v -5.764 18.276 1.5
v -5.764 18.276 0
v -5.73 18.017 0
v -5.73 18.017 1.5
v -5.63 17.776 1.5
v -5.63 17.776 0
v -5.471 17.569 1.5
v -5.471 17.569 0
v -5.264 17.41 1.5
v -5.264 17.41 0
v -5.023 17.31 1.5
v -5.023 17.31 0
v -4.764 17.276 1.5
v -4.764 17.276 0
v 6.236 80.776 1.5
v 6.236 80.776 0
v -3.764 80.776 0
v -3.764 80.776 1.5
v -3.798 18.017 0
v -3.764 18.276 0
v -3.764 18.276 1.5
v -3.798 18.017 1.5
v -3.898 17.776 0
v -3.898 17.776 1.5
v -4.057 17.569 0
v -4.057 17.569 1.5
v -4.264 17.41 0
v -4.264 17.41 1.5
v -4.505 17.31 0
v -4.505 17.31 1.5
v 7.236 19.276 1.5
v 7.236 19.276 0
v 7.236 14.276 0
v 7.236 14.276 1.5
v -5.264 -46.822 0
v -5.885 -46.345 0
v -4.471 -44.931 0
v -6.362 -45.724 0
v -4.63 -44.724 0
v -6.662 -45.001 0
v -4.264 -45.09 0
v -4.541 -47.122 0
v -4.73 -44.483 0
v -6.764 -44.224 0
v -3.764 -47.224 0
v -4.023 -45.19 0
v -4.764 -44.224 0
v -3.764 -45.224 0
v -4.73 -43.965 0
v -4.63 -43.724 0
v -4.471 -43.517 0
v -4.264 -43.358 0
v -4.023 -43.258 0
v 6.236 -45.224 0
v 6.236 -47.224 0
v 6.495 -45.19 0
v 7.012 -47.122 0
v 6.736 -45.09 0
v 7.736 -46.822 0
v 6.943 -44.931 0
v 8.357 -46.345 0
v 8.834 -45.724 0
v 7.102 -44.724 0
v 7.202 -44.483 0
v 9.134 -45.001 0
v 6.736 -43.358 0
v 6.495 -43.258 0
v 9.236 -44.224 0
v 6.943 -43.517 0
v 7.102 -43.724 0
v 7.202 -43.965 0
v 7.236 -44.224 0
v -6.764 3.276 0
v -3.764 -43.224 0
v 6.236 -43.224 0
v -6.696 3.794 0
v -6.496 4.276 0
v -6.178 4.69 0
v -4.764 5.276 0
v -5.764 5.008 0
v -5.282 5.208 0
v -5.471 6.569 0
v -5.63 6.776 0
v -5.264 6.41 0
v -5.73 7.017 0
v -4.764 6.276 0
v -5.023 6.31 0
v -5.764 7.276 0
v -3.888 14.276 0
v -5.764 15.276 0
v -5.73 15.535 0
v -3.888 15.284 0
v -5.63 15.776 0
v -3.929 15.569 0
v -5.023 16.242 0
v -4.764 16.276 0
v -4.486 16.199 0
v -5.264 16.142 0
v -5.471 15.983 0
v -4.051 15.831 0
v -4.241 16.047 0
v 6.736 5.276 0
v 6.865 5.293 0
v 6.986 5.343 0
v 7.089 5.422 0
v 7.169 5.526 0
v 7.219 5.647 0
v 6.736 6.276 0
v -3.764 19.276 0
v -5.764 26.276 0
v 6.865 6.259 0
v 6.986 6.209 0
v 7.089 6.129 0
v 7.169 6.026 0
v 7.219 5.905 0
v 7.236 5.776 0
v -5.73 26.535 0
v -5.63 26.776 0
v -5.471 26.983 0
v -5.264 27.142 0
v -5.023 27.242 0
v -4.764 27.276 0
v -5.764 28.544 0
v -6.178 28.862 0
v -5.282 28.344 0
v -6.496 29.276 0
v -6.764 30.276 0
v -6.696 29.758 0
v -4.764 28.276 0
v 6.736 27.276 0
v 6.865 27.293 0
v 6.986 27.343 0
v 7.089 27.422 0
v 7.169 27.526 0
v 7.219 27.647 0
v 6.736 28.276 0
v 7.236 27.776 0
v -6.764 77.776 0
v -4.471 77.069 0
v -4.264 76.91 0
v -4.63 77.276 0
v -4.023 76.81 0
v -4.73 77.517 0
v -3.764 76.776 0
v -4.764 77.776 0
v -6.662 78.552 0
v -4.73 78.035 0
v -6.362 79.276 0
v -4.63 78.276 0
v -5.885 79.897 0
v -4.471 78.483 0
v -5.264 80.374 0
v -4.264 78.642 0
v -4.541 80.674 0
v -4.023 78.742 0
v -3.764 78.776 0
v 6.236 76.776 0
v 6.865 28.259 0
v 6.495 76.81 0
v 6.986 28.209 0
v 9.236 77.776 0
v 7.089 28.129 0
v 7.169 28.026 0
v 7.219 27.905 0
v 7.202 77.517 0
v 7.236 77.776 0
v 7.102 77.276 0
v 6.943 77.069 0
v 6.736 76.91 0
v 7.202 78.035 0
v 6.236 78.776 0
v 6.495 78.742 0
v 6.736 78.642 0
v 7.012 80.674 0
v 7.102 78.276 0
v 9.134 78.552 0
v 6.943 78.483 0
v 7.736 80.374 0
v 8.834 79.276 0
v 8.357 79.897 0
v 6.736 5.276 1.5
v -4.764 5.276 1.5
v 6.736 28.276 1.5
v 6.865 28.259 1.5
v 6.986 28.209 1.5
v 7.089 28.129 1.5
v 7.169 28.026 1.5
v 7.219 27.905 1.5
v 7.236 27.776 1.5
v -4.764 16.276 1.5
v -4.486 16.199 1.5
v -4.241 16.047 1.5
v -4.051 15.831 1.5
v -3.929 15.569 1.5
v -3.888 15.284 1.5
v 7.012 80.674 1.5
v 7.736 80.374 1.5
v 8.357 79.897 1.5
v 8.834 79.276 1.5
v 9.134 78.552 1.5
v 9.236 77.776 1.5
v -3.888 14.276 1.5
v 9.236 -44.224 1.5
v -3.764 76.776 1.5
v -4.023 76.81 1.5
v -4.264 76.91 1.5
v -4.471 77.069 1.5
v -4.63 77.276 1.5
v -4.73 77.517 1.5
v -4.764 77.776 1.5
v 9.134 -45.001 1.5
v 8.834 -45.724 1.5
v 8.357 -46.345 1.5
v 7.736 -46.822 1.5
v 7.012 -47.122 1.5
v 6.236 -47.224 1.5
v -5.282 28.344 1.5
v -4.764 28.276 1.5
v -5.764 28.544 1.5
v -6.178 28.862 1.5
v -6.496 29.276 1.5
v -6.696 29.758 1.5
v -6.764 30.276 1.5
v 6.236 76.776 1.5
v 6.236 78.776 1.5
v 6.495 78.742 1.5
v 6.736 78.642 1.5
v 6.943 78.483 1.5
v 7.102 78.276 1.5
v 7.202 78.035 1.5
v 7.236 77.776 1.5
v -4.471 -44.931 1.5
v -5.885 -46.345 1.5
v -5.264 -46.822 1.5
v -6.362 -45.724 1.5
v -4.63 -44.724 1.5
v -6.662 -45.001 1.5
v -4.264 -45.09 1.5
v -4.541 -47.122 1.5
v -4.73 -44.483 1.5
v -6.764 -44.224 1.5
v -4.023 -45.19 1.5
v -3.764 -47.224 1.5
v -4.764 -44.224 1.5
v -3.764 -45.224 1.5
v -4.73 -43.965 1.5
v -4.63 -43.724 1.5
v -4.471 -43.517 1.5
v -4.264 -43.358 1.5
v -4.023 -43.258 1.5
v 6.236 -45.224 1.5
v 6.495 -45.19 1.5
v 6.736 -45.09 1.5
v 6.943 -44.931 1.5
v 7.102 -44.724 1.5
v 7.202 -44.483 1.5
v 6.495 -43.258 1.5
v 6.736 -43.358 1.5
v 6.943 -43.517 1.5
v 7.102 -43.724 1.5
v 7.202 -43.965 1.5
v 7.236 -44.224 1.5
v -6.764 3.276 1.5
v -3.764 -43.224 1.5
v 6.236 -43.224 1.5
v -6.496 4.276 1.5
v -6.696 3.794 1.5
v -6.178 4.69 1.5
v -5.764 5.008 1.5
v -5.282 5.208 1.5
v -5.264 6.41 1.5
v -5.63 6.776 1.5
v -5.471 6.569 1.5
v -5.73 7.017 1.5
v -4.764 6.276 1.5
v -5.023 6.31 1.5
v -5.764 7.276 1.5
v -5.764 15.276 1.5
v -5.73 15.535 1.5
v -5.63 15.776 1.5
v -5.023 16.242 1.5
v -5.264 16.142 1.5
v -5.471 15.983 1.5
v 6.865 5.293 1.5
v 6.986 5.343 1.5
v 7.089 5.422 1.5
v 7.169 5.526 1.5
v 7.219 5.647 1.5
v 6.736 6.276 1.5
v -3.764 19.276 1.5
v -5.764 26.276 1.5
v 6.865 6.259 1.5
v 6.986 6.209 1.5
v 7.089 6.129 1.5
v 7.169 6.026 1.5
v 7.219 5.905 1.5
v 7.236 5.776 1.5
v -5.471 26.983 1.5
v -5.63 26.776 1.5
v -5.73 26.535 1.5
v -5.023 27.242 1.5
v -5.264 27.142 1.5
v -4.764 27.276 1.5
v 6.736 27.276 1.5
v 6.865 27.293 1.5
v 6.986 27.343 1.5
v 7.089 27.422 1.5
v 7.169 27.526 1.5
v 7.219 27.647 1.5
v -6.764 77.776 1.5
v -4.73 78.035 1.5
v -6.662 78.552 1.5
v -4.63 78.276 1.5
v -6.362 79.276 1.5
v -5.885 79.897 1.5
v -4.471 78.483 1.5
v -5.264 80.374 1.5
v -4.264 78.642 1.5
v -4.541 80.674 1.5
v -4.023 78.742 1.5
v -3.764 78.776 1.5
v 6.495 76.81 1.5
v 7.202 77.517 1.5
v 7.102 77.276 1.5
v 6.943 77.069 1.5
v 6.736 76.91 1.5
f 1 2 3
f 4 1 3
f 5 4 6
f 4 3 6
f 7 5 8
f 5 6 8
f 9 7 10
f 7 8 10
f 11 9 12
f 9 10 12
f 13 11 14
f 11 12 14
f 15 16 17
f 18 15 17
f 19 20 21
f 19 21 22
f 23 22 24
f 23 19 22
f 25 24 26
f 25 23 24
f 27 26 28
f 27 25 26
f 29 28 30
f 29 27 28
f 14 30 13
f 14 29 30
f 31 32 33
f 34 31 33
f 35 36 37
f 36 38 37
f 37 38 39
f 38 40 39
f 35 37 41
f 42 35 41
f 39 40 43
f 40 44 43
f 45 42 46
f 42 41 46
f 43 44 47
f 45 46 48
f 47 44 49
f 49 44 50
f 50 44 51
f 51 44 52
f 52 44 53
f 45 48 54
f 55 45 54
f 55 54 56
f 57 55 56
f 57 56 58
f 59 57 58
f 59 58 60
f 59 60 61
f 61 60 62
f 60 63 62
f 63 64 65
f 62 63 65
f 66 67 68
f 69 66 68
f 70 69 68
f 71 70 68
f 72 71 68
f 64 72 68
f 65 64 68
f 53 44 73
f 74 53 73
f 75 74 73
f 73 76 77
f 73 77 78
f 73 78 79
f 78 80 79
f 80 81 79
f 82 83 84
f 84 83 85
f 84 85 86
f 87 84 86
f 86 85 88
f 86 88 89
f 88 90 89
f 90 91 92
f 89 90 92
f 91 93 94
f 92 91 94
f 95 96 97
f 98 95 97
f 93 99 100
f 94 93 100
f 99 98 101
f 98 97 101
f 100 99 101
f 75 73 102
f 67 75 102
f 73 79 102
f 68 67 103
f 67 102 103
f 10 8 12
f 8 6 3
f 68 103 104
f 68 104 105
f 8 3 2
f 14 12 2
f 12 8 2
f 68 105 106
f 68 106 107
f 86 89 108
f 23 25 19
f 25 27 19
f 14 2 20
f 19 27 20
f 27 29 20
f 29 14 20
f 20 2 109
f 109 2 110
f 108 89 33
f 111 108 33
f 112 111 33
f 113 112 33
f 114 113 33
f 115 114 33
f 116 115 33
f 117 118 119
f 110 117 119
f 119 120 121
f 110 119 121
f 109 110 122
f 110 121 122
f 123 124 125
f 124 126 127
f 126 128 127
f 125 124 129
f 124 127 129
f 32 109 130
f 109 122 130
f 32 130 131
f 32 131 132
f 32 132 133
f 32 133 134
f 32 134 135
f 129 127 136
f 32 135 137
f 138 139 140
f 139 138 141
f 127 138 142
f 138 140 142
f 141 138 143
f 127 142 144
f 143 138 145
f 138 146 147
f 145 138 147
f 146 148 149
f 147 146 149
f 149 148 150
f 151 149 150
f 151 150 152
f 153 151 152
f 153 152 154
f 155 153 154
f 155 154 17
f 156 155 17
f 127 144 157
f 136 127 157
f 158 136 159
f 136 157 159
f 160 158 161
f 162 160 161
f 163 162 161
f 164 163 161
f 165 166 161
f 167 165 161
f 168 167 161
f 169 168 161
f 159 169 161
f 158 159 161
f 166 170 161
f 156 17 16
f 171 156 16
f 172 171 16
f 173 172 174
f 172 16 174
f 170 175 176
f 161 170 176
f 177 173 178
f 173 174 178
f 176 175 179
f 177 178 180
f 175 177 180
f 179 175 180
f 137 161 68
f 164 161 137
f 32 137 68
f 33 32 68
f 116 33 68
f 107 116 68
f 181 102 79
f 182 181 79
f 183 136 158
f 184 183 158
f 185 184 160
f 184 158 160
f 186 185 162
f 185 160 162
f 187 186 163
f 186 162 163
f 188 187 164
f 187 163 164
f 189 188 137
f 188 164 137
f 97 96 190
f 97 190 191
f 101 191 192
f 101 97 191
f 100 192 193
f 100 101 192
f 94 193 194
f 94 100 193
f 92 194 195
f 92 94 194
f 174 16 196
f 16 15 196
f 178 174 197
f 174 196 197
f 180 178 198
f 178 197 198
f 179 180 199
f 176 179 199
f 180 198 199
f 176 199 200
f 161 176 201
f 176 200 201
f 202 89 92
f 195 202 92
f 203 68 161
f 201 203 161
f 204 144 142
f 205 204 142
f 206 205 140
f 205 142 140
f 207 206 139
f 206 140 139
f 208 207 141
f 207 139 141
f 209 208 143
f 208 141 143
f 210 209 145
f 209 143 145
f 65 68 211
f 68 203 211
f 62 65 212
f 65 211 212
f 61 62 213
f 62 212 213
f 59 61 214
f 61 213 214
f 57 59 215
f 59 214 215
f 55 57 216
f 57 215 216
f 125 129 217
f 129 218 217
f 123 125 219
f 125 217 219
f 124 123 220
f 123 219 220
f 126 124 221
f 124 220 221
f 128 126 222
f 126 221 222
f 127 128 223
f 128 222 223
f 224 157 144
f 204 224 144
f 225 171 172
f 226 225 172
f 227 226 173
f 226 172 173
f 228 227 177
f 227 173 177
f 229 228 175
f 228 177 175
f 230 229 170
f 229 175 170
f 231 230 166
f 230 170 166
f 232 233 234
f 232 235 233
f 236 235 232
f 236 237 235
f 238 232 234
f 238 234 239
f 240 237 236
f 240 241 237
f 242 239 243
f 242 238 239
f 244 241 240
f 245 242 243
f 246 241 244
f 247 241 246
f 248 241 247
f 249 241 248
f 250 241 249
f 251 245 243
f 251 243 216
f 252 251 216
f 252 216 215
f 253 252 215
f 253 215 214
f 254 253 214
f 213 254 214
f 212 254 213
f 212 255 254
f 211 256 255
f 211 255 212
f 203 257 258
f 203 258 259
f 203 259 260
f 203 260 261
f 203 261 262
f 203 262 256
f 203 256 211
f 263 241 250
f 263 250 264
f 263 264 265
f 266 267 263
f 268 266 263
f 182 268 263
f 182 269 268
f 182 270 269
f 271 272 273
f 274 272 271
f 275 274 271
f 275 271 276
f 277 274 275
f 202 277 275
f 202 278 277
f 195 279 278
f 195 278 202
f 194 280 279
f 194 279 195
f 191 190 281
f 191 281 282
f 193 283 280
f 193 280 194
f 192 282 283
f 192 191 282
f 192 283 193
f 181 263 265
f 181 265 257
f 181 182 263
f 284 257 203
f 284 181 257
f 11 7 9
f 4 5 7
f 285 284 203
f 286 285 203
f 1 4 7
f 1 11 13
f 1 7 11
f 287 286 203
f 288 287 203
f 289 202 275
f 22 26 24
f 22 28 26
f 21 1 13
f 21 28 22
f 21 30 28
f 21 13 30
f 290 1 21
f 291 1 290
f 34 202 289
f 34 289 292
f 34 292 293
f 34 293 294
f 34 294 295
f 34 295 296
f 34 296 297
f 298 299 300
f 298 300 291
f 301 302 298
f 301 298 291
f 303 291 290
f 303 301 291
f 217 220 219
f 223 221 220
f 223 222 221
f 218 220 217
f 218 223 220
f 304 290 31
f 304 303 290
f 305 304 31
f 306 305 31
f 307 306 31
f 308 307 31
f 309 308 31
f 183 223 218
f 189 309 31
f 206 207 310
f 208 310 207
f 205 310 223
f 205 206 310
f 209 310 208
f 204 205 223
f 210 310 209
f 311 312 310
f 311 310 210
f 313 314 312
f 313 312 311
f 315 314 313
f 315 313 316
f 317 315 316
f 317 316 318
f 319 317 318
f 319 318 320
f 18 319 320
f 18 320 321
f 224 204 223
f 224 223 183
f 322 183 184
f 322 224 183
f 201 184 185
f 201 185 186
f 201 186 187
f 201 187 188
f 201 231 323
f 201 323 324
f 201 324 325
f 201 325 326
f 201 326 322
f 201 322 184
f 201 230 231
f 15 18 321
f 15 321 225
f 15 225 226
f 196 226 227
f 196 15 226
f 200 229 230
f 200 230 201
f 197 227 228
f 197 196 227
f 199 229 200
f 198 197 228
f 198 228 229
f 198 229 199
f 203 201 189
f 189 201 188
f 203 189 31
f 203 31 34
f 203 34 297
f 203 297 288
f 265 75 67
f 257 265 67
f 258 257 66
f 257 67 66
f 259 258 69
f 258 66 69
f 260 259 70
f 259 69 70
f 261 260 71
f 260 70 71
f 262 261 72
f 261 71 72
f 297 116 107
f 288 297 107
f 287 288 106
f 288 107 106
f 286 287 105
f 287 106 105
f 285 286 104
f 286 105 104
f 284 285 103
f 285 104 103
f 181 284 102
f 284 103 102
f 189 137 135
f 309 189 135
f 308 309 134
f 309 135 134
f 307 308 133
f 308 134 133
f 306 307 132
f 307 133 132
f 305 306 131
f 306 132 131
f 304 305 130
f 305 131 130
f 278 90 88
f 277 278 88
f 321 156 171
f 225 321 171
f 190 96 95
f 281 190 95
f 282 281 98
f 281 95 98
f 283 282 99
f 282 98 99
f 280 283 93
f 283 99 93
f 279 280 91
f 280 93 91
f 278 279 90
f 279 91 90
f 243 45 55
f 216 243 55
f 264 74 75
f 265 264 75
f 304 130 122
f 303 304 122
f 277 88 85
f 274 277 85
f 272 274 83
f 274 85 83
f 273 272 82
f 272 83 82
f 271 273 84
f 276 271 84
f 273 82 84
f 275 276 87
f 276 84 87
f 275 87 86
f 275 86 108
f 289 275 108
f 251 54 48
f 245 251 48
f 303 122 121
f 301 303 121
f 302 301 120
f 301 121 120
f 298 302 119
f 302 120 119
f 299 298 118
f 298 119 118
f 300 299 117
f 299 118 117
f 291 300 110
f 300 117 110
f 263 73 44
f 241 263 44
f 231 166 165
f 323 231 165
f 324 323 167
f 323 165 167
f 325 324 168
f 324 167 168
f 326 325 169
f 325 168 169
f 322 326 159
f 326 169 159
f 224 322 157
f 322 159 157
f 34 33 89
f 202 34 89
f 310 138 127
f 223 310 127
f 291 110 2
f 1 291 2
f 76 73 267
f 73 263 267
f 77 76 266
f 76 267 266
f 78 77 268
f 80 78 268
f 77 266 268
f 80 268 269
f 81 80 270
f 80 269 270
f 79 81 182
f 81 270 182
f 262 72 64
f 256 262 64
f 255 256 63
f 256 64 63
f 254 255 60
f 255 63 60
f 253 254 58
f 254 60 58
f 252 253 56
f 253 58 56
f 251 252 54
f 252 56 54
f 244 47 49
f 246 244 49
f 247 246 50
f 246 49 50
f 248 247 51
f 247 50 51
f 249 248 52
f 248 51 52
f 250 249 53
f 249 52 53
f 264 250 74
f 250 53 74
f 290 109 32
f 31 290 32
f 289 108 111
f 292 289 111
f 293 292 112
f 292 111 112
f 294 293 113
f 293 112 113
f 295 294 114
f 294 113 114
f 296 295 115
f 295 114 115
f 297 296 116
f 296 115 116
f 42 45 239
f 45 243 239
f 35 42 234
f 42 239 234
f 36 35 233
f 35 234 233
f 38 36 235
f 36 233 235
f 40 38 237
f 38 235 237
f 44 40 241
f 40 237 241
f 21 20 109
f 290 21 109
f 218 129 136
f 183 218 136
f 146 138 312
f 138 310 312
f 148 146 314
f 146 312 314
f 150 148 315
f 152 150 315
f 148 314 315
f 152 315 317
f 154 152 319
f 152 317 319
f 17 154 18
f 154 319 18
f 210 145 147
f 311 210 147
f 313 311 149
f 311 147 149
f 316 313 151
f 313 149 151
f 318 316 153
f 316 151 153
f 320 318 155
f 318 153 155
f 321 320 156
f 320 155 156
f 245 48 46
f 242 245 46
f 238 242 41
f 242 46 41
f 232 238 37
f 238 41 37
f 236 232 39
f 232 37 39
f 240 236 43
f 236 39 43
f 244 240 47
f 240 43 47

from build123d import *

# Parameters (mm, degrees)
F1_DEPTH    = 1.5
F2_T1_DEPTH = 6.5
F2_T3_DEPTH = 6.4616050658
F3_R        = 2
F4_R        = 3


# Not quite as in the source:
# - a fillet or chamfer that OpenCascade refuses, or shapes differently, is made with other operations: its cross-section is extruded or revolved along the edge and cut away or added


with BuildPart() as f1:
    # F0 (on Top) → F1 (new body)
    with BuildSketch(Plane.XY):
        with BuildLine():
            Line((6.7359172925, 27.2759429877), (-4.7640827075, 27.2759429877))
            ThreePointArc((-4.7640827075, 27.2759429877), (-5.4711894887, 26.9830497689), (-5.7640827075, 26.2759429877))
            Line((-5.7640827075, 26.2759429877), (-5.7640827075, 18.2759429877))
            ThreePointArc((-5.7640827075, 18.2759429877), (-5.4711894887, 17.5688362065), (-4.7640827075, 17.2759429877))
            Line((-4.7640827075, 17.2759429877), (-3.7640827075, 17.2759429877))
            Line((-3.7640827075, 17.2759429877), (-3.7640827075, 19.2759429877))
            Line((-3.7640827075, 19.2759429877), (7.2359172925, 19.2759429877))
            Line((7.2359172925, 19.2759429877), (7.2359172925, 17.2759429877))
            Line((7.2359172925, 17.2759429877), (7.2359172925, 16.2759429877))
            Line((7.2359172925, 16.2759429877), (7.2359172925, 14.2759429877))
            Line((7.2359172925, 14.2759429877), (-3.8877718616, 14.2759429877))
            Line((-3.8877718616, 14.2759429877), (-3.8877718616, 16.2759429877))
            Line((-3.8877718616, 16.2759429877), (-4.7640827075, 16.2759429877))
            ThreePointArc((-4.7640827075, 16.2759429877), (-5.4711894887, 15.9830497689), (-5.7640827075, 15.2759429877))
            Line((-5.7640827075, 15.2759429877), (-5.7640827075, 7.2759429877))
            ThreePointArc((-5.7640827075, 7.2759429877), (-5.4711894887, 6.5688362065), (-4.7640827075, 6.2759429877))
            Line((-4.7640827075, 6.2759429877), (6.7359172925, 6.2759429877))
            ThreePointArc((6.7359172925, 6.2759429877), (7.0894706831, 6.1294963783), (7.2359172925, 5.7759429877))
            ThreePointArc((7.2359172925, 5.7759429877), (7.0894706831, 5.4223895971), (6.7359172925, 5.2759429877))
            Line((6.7359172925, 5.2759429877), (-5.7640827075, 5.2759429877))
            Line((-5.7640827075, 5.2759429877), (-6.7640827075, 5.2759429877))
            Line((-6.7640827075, 5.2759429877), (-6.7640827075, -47.2240570123))
            Line((-6.7640827075, -47.2240570123), (9.2359172925, -47.2240570123))
            Line((9.2359172925, -47.2240570123), (9.2359172925, 80.7759429877))
            Line((9.2359172925, 80.7759429877), (-6.7640827075, 80.7759429877))
            Line((-6.7640827075, 80.7759429877), (-6.7640827075, 28.2759429877))
            Line((-6.7640827075, 28.2759429877), (-5.7640827075, 28.2759429877))
            Line((-5.7640827075, 28.2759429877), (6.7359172925, 28.2759429877))
            ThreePointArc((6.7359172925, 28.2759429877), (7.0894706831, 28.1294963783), (7.2359172925, 27.7759429877))
            ThreePointArc((7.2359172925, 27.7759429877), (7.0894706831, 27.4223895971), (6.7359172925, 27.2759429877))
        make_face()
        with BuildLine():
            ThreePointArc((-4.7640827075, -44.2240570123), (-4.4711894887, -43.5169502311), (-3.7640827075, -43.2240570123))
            Line((-3.7640827075, -43.2240570123), (6.2359172925, -43.2240570123))
            ThreePointArc((6.2359172925, -43.2240570123), (6.9430240737, -43.5169502311), (7.2359172925, -44.2240570123))
            ThreePointArc((7.2359172925, -44.2240570123), (6.9430240737, -44.9311637935), (6.2359172925, -45.2240570123))
            Line((6.2359172925, -45.2240570123), (-3.7640827075, -45.2240570123))
            ThreePointArc((-3.7640827075, -45.2240570123), (-4.4711894887, -44.9311637935), (-4.7640827075, -44.2240570123))
        make_face(mode=Mode.SUBTRACT)
        with BuildLine():
            Line((6.2359172925, 76.7759429877), (-3.7640827075, 76.7759429877))
            ThreePointArc((-3.7640827075, 76.7759429877), (-4.4711894887, 77.0688362065), (-4.7640827075, 77.7759429877))
            ThreePointArc((-4.7640827075, 77.7759429877), (-4.4711894887, 78.4830497689), (-3.7640827075, 78.7759429877))
            Line((-3.7640827075, 78.7759429877), (6.2359172925, 78.7759429877))
            ThreePointArc((6.2359172925, 78.7759429877), (6.9430240737, 78.4830497689), (7.2359172925, 77.7759429877))
            ThreePointArc((7.2359172925, 77.7759429877), (6.9430240737, 77.0688362065), (6.2359172925, 76.7759429877))
        make_face(mode=Mode.SUBTRACT)
    extrude(amount=F1_DEPTH)

    # F2: fillet of radius 1 on 2 edges, made by hand

    # F2_s2 → F2_t1 (cut)
    with BuildSketch(Plane.XY.offset(-2.5)):
        with BuildLine():
            ThreePointArc((-3.7640827075, 18.2759429877), (-4.0569759263, 17.5688362065), (-4.7640827075, 17.2759429877))
            Line((-4.7640827075, 17.2759429877), (-3.7640827075, 17.2759429877))
            Line((-3.7640827075, 17.2759429877), (-3.7640827075, 18.2759429877))
        make_face()
    extrude(amount=F2_T1_DEPTH, mode=Mode.SUBTRACT)

    # F2_s4 → F2_t3 (cut)
    with BuildSketch(Plane.XY.offset(-2.4808025329)):
        with BuildLine():
            ThreePointArc((-4.7640827075, 16.2759429877), (-4.1382089376, 15.94555507), (-3.8877718616, 15.2836219745))
            Line((-3.8877718616, 15.2836219745), (-3.8877718616, 16.2759429877))
            Line((-3.8877718616, 16.2759429877), (-4.7640827075, 16.2759429877))
        make_face()
    extrude(amount=F2_T3_DEPTH, mode=Mode.SUBTRACT)

    # F3
    f3_edges = [f1.edges().sort_by_distance(p)[0] for p in [
        (-6.764083, 28.275943, 0.75),
        (-6.764083, 5.275943, 0.75),
    ]]
    fillet(f3_edges, radius=F3_R)

    # F4
    f4_edges = [f1.edges().sort_by_distance(p)[0] for p in [
        (9.235917, 80.775943, 0.75),
        (-6.764083, 80.775943, 0.75),
        (-6.764083, -47.224057, 0.75),
        (9.235917, -47.224057, 0.75),
    ]]
    fillet(f4_edges, radius=F4_R)


solid = f1.part
